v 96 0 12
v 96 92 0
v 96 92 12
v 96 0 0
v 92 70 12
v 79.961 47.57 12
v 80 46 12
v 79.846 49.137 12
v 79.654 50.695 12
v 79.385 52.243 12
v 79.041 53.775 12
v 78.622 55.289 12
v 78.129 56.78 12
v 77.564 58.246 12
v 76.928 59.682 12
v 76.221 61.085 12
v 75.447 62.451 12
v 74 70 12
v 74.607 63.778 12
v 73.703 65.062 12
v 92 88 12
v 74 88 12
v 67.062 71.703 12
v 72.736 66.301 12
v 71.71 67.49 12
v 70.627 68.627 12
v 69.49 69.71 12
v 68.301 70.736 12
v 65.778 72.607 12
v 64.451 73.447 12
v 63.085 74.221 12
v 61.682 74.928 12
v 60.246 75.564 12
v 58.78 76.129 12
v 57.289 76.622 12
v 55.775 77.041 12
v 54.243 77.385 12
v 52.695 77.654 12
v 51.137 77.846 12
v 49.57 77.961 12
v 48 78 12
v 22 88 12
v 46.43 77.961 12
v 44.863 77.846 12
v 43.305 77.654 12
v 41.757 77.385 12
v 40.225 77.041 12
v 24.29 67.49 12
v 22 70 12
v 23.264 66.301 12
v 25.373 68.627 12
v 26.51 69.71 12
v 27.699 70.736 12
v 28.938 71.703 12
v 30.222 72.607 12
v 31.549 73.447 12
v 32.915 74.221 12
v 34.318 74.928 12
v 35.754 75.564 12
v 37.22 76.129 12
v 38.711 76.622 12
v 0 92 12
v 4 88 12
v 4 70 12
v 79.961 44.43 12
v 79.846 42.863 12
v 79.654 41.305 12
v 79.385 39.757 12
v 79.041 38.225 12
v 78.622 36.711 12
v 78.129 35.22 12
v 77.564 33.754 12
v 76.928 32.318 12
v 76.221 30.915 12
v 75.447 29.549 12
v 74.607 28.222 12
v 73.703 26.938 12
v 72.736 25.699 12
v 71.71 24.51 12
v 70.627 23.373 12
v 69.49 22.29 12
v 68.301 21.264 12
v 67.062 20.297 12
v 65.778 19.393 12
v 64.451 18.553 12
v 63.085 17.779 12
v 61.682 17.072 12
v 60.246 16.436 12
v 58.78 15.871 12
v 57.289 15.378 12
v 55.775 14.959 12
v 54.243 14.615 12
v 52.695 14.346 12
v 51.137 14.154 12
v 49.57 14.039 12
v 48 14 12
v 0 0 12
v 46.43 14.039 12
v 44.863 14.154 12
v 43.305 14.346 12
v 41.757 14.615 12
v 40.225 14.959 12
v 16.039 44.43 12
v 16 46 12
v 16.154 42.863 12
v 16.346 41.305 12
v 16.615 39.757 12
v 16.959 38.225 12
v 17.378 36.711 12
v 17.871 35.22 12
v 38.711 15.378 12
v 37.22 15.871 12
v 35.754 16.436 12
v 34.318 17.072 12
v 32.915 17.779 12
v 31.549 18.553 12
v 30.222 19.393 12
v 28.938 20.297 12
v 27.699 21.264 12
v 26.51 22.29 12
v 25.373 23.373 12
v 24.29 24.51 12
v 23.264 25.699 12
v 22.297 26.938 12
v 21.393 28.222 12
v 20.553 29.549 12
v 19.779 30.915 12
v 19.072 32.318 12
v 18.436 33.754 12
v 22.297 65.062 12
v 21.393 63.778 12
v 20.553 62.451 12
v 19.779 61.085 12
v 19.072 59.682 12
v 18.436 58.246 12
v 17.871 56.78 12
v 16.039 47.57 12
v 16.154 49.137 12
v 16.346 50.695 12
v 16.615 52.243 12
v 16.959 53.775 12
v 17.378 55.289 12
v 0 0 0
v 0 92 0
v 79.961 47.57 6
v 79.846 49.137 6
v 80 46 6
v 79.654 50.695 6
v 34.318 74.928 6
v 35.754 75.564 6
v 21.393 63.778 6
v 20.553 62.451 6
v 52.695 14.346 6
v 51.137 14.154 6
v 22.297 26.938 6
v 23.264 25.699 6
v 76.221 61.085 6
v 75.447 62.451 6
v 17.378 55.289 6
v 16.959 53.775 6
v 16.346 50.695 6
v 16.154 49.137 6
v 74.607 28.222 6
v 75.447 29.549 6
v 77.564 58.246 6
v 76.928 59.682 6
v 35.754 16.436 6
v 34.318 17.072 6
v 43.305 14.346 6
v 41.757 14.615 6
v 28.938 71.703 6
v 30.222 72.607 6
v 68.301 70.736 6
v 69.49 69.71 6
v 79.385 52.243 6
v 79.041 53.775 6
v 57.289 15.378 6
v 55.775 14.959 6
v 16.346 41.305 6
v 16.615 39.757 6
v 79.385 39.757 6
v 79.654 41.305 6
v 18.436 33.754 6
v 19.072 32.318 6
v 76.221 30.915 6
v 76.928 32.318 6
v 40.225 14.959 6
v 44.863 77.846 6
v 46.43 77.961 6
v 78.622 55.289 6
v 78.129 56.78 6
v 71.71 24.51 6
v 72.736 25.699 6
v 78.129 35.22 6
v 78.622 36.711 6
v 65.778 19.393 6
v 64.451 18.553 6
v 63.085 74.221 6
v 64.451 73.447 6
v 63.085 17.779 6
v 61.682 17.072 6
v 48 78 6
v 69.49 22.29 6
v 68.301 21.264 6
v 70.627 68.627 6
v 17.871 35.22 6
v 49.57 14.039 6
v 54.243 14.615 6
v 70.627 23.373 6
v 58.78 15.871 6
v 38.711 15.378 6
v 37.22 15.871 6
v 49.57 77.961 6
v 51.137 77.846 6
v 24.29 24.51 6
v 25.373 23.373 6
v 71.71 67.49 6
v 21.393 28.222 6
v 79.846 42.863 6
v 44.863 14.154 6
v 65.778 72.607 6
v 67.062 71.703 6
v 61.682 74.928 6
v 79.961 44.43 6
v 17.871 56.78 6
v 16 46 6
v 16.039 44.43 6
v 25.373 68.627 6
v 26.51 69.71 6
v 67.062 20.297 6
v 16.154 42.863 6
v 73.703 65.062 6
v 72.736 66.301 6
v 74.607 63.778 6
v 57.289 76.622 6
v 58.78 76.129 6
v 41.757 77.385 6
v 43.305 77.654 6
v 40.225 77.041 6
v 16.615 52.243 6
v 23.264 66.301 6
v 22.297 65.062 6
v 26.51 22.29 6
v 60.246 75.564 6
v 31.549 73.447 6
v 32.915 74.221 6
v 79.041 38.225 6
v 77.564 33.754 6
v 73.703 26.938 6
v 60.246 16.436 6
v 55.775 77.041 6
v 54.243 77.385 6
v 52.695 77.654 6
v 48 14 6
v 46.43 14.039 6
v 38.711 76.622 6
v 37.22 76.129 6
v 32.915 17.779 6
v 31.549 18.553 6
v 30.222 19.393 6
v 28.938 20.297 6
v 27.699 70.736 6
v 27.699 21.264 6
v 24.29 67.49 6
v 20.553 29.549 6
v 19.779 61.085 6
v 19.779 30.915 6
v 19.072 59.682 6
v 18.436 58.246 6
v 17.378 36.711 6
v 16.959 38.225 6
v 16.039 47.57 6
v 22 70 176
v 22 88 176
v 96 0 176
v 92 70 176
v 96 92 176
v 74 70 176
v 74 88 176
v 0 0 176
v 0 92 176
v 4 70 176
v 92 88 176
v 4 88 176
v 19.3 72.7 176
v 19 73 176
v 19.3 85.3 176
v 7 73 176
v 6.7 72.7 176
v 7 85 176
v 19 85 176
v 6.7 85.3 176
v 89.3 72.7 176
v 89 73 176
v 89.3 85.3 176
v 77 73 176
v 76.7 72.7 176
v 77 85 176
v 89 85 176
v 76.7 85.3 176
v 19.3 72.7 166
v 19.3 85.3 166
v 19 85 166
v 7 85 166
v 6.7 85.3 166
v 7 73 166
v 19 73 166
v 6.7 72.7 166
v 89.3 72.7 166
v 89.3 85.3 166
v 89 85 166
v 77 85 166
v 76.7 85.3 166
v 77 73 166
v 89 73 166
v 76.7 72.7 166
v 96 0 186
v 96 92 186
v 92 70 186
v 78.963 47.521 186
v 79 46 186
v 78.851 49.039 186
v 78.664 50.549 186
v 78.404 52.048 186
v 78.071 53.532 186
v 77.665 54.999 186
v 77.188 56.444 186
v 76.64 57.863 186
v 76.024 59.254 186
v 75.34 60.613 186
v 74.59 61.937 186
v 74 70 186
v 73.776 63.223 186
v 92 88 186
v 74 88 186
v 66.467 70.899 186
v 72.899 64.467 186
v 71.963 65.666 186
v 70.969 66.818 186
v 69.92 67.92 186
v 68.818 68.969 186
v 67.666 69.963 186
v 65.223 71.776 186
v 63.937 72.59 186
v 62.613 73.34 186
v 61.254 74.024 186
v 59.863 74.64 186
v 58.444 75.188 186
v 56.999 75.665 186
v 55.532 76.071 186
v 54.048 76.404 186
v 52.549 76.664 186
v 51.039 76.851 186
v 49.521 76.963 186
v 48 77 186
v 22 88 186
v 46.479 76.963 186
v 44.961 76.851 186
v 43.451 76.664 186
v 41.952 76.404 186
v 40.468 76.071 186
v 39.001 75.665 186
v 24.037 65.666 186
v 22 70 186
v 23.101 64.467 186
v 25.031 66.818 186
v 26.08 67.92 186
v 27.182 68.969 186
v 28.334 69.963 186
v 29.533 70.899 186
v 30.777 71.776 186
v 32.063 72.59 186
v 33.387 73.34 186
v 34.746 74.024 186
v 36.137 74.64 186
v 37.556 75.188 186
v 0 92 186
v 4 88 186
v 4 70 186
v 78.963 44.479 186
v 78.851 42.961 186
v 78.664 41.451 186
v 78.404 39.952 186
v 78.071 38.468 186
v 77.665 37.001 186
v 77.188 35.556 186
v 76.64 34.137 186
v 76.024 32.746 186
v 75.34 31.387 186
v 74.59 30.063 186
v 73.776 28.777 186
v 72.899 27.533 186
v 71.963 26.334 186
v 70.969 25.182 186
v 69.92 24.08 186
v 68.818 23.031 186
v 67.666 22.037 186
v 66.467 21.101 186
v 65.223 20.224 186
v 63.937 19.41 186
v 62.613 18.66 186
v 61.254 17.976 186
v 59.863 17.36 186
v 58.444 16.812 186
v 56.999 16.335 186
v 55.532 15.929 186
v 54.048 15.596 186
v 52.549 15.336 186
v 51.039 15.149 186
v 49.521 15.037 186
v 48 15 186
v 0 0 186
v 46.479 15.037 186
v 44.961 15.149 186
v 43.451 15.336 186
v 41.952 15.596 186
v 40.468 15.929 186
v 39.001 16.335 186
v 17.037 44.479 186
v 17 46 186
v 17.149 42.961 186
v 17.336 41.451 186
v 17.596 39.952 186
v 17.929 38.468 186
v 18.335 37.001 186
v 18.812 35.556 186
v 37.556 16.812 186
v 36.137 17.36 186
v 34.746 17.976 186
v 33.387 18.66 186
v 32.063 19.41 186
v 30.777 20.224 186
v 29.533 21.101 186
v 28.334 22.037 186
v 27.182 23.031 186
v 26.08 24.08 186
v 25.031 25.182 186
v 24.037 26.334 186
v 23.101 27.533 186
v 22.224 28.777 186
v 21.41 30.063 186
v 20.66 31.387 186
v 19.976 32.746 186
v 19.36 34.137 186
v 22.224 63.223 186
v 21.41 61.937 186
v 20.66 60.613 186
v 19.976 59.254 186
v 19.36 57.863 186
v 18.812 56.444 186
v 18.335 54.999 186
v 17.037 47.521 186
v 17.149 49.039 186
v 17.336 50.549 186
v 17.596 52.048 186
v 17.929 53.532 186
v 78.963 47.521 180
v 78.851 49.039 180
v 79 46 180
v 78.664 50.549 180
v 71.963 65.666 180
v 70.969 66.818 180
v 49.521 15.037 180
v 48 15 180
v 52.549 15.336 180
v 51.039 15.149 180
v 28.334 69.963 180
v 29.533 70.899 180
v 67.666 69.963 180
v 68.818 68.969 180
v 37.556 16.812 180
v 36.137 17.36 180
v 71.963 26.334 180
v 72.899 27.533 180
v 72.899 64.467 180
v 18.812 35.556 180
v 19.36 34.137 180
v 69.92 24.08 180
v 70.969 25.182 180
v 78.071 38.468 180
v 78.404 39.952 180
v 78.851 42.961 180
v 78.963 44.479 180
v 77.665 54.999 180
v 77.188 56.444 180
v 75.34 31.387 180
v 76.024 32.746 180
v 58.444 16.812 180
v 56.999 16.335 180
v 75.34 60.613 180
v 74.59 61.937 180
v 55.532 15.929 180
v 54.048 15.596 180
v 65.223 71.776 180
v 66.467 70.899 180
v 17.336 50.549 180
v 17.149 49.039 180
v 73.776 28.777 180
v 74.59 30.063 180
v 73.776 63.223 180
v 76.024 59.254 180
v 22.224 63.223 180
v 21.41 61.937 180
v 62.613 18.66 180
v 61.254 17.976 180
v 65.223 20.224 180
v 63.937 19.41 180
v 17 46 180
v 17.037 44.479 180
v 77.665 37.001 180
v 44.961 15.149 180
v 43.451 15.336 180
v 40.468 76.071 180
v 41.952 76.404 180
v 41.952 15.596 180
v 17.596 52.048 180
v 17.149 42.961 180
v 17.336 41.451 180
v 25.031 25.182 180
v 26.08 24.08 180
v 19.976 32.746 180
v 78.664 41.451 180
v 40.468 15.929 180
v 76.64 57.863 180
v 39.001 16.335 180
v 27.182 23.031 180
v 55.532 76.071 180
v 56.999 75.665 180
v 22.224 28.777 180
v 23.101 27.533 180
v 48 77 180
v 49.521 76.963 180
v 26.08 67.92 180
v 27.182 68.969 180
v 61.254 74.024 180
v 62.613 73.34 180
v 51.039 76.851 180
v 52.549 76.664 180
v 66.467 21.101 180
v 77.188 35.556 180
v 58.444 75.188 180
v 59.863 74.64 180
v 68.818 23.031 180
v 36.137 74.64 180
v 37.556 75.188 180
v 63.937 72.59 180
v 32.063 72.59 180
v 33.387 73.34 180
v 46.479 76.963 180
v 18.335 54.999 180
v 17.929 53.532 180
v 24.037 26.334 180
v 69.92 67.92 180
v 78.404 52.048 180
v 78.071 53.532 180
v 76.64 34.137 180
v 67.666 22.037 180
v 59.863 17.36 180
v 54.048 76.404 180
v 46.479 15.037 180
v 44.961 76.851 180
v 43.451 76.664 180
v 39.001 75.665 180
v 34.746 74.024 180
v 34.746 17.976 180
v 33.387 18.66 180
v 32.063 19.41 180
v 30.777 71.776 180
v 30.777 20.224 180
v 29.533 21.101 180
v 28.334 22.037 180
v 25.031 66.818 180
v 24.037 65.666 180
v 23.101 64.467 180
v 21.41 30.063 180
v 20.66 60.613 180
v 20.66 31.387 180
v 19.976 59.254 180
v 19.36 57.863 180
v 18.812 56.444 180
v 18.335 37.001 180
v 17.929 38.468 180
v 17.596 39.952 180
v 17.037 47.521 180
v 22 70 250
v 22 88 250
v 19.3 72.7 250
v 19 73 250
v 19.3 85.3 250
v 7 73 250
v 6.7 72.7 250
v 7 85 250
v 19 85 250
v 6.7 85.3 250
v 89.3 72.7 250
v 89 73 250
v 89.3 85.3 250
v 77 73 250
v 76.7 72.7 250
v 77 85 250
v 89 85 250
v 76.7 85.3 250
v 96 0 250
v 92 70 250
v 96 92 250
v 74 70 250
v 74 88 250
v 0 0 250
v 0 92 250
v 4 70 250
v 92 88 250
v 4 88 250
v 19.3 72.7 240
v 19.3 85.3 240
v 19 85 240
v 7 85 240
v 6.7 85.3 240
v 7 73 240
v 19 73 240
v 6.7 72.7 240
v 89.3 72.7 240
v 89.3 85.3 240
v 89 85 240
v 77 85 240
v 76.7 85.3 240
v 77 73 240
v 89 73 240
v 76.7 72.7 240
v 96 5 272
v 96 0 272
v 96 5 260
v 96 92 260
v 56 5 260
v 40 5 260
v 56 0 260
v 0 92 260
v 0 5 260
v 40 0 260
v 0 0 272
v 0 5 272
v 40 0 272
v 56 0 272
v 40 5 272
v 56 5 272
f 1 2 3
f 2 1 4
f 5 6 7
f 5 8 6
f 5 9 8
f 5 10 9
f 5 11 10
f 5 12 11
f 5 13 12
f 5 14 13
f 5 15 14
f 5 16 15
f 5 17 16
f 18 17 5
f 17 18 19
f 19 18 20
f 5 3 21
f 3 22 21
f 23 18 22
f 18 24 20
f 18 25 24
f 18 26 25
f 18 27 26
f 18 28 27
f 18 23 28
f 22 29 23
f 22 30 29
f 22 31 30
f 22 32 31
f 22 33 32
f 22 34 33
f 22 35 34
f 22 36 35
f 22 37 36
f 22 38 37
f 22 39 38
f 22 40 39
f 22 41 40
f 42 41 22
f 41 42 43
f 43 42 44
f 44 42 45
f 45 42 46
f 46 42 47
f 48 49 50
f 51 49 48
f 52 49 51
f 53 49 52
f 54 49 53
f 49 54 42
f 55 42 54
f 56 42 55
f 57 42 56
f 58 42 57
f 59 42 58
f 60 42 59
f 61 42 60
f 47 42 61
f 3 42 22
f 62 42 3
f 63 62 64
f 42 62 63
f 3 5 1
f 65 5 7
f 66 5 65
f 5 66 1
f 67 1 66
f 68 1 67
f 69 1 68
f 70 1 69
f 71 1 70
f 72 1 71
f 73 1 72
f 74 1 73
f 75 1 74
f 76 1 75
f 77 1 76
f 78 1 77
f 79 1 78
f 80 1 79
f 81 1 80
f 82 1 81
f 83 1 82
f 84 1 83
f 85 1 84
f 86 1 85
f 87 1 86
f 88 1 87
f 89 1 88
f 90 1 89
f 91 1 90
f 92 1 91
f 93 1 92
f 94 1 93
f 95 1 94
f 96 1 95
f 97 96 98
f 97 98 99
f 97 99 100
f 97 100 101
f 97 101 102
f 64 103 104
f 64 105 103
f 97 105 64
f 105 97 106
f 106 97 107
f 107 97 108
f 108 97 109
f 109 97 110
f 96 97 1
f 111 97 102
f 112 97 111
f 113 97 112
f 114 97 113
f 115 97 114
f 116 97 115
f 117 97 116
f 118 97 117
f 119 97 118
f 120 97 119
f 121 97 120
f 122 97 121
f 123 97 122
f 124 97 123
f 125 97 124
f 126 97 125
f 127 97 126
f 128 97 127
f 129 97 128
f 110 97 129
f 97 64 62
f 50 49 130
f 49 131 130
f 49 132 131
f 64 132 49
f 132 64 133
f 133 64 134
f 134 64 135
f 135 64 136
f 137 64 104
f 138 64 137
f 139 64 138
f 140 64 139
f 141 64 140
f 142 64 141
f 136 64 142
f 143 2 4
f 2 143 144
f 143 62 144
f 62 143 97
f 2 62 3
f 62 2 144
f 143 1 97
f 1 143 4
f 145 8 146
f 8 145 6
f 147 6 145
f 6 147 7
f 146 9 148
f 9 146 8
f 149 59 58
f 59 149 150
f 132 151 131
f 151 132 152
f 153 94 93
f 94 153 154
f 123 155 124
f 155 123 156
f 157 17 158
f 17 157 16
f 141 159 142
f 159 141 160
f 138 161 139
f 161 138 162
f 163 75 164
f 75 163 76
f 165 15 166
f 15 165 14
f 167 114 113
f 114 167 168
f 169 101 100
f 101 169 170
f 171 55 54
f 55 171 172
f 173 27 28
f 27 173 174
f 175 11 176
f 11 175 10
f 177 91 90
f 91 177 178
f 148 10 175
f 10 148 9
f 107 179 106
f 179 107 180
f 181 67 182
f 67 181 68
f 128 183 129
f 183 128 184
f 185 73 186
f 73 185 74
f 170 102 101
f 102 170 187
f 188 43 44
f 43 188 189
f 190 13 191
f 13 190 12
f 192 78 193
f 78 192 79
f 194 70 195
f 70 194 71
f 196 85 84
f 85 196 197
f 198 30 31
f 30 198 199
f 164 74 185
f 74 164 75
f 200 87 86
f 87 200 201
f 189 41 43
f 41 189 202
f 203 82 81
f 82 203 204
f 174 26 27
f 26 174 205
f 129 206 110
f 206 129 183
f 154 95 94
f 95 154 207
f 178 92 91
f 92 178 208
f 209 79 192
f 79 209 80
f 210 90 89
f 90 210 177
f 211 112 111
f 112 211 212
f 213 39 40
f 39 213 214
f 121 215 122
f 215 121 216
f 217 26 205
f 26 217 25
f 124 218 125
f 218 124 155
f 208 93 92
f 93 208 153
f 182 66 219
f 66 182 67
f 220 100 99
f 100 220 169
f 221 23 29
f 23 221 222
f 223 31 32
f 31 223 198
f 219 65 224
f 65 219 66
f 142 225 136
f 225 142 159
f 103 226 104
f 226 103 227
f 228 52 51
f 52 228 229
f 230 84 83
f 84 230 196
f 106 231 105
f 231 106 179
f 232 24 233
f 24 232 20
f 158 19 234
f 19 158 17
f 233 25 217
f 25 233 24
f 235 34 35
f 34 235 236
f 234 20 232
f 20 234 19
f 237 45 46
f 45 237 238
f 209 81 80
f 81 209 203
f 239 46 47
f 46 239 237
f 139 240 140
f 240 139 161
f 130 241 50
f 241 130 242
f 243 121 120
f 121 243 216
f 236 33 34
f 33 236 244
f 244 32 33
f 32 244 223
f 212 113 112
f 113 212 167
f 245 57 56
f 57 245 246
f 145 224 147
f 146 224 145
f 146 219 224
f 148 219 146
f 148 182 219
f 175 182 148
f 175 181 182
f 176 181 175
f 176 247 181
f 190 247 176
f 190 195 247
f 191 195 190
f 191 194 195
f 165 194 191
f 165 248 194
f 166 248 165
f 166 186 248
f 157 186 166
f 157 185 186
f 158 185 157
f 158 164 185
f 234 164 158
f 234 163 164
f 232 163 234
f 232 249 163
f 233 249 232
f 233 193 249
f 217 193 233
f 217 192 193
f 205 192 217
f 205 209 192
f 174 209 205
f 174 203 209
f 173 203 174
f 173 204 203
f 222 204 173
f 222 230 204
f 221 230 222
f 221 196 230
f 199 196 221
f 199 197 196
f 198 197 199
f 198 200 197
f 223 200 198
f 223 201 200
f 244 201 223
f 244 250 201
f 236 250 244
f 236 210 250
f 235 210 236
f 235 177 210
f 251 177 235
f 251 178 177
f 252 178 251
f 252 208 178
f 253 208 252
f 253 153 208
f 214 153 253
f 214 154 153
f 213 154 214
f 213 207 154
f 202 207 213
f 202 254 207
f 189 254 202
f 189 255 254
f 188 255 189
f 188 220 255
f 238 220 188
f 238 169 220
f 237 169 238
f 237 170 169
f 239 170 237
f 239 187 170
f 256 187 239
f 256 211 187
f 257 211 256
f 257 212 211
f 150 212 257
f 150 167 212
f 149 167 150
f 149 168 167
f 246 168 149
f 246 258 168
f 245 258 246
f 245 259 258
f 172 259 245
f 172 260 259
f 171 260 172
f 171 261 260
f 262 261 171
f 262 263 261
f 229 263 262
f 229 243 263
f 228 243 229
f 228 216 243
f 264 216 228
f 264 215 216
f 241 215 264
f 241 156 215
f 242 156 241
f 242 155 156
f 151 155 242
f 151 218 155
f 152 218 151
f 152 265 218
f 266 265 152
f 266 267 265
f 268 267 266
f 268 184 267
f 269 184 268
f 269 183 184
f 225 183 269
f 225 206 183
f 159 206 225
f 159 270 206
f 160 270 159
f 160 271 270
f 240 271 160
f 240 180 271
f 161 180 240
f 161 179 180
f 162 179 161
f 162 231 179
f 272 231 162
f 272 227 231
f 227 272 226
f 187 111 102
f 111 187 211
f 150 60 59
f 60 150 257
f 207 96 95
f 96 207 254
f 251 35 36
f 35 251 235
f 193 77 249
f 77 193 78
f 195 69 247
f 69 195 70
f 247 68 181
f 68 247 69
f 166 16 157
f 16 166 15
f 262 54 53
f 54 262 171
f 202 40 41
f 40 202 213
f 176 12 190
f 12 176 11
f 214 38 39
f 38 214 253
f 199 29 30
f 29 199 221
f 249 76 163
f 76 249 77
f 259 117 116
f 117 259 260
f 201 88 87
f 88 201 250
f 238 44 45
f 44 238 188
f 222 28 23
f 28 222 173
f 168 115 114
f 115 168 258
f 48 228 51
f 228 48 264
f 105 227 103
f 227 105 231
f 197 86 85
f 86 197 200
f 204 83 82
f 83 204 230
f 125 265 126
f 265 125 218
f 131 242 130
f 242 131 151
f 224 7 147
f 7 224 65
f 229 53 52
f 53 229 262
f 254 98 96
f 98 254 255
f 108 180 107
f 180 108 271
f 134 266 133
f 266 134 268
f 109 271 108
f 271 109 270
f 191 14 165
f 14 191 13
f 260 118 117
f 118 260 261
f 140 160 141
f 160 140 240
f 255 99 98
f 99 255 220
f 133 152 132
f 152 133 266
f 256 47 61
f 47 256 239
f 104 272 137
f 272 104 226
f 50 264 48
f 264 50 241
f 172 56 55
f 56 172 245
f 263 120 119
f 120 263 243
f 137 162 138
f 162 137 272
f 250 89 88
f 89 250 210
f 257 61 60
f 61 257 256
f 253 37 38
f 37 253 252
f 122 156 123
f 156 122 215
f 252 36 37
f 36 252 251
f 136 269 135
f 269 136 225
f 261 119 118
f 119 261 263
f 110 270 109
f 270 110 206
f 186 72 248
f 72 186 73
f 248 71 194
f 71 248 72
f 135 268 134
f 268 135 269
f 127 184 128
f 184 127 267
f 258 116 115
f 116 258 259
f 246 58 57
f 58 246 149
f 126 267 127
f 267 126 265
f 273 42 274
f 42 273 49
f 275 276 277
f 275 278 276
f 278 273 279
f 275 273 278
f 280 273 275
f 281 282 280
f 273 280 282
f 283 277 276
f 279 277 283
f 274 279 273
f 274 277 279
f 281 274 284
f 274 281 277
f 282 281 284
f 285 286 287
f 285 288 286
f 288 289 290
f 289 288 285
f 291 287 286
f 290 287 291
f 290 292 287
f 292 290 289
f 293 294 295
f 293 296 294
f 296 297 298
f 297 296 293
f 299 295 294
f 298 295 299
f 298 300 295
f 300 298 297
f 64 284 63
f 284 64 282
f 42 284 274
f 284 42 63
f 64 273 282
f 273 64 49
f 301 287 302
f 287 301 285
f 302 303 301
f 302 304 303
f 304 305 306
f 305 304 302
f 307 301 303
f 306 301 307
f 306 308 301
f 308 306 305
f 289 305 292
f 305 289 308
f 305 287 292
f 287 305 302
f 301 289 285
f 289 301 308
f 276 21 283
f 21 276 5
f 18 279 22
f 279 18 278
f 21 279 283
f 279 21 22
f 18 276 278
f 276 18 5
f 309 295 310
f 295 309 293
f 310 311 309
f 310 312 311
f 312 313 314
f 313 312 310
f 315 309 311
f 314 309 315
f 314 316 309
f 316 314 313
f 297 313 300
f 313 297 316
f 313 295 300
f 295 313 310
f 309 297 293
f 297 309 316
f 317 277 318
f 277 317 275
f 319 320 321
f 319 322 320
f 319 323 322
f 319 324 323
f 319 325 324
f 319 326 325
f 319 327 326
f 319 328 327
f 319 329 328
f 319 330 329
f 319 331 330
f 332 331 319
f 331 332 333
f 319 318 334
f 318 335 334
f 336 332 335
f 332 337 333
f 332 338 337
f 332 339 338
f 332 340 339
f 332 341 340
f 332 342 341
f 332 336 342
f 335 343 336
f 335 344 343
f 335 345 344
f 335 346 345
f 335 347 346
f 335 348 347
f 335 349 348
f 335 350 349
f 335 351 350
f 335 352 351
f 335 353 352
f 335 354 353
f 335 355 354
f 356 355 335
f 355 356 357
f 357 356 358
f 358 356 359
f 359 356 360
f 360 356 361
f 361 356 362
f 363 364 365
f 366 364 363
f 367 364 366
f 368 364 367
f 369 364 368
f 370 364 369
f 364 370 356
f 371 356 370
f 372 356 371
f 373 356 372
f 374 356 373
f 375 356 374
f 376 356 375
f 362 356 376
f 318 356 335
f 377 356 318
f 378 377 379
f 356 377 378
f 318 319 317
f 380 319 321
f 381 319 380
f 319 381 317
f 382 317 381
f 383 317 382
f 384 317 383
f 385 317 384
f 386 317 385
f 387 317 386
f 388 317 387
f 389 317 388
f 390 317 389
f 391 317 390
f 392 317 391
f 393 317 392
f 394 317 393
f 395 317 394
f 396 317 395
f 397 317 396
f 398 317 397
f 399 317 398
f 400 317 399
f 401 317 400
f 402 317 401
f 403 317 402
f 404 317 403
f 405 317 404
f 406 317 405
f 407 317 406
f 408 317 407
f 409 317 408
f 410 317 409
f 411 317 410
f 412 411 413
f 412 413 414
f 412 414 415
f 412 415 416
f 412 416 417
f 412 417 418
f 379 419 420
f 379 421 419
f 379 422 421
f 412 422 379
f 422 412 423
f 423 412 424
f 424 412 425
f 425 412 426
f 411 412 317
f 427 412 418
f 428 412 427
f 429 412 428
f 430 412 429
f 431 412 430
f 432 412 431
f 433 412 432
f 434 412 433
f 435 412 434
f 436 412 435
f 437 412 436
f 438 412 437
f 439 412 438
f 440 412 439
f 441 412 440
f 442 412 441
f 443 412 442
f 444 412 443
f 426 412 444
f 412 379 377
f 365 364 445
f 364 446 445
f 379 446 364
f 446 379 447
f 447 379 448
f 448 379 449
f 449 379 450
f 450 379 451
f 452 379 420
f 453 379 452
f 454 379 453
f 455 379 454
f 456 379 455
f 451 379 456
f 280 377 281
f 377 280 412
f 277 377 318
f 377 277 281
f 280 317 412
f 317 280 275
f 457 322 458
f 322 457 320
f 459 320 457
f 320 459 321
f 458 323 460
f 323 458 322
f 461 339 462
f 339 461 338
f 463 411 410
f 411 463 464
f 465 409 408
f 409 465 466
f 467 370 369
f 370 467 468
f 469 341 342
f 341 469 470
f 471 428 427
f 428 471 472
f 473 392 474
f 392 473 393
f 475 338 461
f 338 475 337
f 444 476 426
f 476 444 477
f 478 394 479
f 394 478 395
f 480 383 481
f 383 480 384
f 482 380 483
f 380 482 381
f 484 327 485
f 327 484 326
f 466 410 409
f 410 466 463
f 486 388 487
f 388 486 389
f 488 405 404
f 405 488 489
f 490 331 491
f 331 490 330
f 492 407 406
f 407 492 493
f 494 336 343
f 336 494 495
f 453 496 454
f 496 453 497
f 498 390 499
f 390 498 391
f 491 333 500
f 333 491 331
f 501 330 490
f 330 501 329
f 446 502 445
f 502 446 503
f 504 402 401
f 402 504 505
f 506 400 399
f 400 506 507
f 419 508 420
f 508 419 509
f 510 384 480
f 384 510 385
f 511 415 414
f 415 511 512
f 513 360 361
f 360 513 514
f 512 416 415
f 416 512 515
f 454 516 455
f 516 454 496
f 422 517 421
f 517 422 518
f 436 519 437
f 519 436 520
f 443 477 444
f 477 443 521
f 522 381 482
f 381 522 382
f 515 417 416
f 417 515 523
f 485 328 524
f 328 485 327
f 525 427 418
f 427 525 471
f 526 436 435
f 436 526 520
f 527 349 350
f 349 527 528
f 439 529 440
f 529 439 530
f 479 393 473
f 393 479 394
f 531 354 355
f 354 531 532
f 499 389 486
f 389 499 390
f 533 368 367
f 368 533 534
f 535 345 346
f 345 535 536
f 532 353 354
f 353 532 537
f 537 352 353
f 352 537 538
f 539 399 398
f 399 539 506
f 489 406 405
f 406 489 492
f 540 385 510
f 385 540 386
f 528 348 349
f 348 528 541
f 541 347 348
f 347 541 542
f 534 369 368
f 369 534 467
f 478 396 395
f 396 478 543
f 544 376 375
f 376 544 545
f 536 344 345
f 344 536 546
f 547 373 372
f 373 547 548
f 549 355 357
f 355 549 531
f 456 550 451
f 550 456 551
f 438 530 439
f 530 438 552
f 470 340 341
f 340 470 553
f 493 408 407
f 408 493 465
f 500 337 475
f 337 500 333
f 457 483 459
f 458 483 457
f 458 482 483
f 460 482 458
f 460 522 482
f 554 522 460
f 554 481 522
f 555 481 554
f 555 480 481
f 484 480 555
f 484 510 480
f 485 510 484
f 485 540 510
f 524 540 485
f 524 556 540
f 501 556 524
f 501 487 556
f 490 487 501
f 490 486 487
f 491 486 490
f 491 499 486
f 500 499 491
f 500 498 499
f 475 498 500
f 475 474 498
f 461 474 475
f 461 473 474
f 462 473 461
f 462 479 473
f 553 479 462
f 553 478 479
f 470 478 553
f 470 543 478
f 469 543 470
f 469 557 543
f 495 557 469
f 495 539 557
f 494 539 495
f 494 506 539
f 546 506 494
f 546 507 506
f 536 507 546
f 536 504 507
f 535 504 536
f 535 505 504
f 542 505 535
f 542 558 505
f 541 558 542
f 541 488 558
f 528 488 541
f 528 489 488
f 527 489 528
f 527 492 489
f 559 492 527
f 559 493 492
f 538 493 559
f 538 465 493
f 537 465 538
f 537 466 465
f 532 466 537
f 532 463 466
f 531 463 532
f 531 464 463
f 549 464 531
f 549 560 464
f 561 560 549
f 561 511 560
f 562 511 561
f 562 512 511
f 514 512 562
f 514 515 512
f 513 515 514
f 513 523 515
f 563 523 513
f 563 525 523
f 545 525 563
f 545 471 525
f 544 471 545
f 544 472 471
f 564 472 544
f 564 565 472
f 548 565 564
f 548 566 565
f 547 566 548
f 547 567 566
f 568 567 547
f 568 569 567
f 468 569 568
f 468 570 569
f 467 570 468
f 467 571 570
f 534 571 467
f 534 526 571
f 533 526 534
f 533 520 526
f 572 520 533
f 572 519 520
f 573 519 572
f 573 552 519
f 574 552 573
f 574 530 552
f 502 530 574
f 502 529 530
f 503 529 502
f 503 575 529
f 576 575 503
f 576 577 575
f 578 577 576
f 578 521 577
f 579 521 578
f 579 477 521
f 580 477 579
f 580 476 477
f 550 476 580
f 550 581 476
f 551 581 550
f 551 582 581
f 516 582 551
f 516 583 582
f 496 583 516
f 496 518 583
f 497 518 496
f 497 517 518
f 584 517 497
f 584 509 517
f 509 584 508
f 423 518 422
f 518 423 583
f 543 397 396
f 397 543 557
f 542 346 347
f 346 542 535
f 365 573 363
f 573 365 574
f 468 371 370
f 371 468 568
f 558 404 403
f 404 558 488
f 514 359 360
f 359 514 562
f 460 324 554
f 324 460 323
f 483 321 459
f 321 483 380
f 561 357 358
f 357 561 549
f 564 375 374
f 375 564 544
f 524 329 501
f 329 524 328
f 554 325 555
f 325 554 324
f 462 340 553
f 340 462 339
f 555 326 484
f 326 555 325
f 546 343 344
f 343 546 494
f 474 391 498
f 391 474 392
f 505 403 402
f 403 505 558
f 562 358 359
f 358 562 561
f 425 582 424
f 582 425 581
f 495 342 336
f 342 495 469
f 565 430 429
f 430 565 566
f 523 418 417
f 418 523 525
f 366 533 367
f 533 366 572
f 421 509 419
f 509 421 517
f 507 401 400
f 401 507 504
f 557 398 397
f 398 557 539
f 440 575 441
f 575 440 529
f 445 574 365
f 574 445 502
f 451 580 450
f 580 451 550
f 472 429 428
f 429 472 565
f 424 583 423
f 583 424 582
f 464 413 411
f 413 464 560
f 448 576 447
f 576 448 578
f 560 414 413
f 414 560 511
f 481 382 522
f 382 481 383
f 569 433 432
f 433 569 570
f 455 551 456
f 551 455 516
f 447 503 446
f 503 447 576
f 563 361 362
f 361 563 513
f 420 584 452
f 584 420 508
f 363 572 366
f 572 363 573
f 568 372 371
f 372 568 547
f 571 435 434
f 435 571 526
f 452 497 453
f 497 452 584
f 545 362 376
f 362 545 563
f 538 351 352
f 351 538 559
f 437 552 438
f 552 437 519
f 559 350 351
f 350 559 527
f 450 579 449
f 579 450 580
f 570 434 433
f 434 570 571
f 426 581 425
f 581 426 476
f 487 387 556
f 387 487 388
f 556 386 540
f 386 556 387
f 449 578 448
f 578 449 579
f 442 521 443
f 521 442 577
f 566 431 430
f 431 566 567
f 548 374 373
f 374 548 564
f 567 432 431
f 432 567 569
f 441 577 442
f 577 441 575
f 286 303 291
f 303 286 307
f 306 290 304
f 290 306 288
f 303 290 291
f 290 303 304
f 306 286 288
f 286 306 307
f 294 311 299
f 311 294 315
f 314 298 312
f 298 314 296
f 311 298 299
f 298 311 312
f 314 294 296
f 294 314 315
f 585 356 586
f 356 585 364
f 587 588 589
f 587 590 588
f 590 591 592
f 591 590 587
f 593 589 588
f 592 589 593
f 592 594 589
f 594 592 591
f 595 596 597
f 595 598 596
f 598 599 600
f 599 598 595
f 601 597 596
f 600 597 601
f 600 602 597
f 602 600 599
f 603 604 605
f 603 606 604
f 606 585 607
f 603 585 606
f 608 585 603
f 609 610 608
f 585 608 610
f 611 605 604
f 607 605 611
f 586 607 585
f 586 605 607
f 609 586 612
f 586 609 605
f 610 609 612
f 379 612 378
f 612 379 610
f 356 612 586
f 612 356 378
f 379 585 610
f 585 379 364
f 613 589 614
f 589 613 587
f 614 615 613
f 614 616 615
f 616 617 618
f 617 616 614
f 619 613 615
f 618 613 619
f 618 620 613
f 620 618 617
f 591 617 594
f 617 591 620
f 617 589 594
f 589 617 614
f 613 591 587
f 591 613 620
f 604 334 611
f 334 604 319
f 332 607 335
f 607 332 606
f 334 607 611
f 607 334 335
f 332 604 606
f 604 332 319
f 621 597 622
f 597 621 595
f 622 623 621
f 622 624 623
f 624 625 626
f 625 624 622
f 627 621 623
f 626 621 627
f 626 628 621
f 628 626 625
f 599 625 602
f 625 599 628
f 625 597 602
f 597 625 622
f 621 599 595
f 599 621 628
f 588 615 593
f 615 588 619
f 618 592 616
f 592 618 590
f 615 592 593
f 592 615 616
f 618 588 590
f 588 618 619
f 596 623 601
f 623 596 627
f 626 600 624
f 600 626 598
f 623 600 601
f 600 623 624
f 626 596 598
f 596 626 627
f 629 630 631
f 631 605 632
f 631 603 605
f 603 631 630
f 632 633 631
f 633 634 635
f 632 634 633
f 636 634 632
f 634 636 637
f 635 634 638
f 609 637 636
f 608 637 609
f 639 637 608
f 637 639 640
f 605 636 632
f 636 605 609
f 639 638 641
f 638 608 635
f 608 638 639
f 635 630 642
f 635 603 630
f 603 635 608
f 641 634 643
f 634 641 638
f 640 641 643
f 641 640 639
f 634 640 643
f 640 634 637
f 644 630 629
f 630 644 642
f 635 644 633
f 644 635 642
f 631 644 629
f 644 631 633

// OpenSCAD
// Comandante C40 stand — two-story tower (v1)
// 1F: body, 2F: grounds jar, roof: crank hook. Floors double as dust lids.
// Front is open: body and jar slide out forward (blind recesses, no through holes).
// Units: mm. Origin: front-left-bottom corner of the footprint. Z up.
// part: "all" | "base" | "middle" | "roof"

part = "all";

// ---- parameters ----
W = 96;              // footprint width  (x)
D = 92;              // footprint depth  (y)

base_t = 12;         // 1F floor thickness
body_bore = 64;      // body recess diameter (C40 body ~61 + clearance)
body_recess_d = 6;   // blind recess depth (shallow: slide-out step)
body_c = [48, 46];   // body centre (x, y)

f2_under = 176;      // underside of 2F floor (body top 166 + slide lift 6 + margin 4)
f2_t = 10;           // 2F floor thickness -> top at 186
jar_bore = 62;       // jar recess diameter (jar ~60 + clearance)
jar_recess_d = 6;
jar_c = [48, 46];

roof_under = 250;    // underside of roof (jar top 245 + margin 5)
roof_t = 10;         // roof thickness -> top at 260
lip_h = 12;          // front lip height above roof (crank rest)
lip_t = 5;           // front lip thickness
notch_w = 16;        // centre notch in the lip for the crank shaft

post = 18;           // back post cross-section (square)
post_inset = 4;      // post inset from footprint edges
socket = 12.6;       // tenon socket (12 peg + 0.3 clearance per side)
socket_d = 10;
peg = 12;            // tenon peg cross-section
peg_l = 10;

$fn = 128;

post_x = [post_inset, W - post_inset - post];
post_y = D - post_inset - post;

module posts(h_z0, h_z1, sockets) {
    for (x = post_x)
        translate([x, post_y, h_z0])
            difference() {
                cube([post, post, h_z1 - h_z0]);
                if (sockets)
                    translate([(post - socket) / 2, (post - socket) / 2, h_z1 - h_z0 - socket_d])
                        cube([socket, socket, socket_d + 1]);
            }
}

module pegs(z_top) {
    for (x = post_x)
        translate([x + (post - peg) / 2, post_y + (post - peg) / 2, z_top - peg_l])
            cube([peg, peg, peg_l]);
}

module base() {
    difference() {
        cube([W, D, base_t]);
        translate([body_c[0], body_c[1], base_t - body_recess_d])
            cylinder(h = body_recess_d + 1, d = body_bore);
    }
    posts(base_t, f2_under, true);
}

module middle() {
    difference() {
        translate([0, 0, f2_under]) cube([W, D, f2_t]);
        translate([jar_c[0], jar_c[1], f2_under + f2_t - jar_recess_d])
            cylinder(h = jar_recess_d + 1, d = jar_bore);
    }
    pegs(f2_under);
    posts(f2_under + f2_t, roof_under, true);
}

module roof() {
    translate([0, 0, roof_under]) cube([W, D, roof_t]);
    pegs(roof_under);
    // front lip with a centre notch for the crank shaft
    lip_z = roof_under + roof_t;
    translate([0, 0, lip_z]) cube([(W - notch_w) / 2, lip_t, lip_h]);
    translate([(W + notch_w) / 2, 0, lip_z]) cube([(W - notch_w) / 2, lip_t, lip_h]);
}

if (part == "all") { base(); middle(); roof(); }
if (part == "base") base();
if (part == "middle") middle();
if (part == "roof") roof();
